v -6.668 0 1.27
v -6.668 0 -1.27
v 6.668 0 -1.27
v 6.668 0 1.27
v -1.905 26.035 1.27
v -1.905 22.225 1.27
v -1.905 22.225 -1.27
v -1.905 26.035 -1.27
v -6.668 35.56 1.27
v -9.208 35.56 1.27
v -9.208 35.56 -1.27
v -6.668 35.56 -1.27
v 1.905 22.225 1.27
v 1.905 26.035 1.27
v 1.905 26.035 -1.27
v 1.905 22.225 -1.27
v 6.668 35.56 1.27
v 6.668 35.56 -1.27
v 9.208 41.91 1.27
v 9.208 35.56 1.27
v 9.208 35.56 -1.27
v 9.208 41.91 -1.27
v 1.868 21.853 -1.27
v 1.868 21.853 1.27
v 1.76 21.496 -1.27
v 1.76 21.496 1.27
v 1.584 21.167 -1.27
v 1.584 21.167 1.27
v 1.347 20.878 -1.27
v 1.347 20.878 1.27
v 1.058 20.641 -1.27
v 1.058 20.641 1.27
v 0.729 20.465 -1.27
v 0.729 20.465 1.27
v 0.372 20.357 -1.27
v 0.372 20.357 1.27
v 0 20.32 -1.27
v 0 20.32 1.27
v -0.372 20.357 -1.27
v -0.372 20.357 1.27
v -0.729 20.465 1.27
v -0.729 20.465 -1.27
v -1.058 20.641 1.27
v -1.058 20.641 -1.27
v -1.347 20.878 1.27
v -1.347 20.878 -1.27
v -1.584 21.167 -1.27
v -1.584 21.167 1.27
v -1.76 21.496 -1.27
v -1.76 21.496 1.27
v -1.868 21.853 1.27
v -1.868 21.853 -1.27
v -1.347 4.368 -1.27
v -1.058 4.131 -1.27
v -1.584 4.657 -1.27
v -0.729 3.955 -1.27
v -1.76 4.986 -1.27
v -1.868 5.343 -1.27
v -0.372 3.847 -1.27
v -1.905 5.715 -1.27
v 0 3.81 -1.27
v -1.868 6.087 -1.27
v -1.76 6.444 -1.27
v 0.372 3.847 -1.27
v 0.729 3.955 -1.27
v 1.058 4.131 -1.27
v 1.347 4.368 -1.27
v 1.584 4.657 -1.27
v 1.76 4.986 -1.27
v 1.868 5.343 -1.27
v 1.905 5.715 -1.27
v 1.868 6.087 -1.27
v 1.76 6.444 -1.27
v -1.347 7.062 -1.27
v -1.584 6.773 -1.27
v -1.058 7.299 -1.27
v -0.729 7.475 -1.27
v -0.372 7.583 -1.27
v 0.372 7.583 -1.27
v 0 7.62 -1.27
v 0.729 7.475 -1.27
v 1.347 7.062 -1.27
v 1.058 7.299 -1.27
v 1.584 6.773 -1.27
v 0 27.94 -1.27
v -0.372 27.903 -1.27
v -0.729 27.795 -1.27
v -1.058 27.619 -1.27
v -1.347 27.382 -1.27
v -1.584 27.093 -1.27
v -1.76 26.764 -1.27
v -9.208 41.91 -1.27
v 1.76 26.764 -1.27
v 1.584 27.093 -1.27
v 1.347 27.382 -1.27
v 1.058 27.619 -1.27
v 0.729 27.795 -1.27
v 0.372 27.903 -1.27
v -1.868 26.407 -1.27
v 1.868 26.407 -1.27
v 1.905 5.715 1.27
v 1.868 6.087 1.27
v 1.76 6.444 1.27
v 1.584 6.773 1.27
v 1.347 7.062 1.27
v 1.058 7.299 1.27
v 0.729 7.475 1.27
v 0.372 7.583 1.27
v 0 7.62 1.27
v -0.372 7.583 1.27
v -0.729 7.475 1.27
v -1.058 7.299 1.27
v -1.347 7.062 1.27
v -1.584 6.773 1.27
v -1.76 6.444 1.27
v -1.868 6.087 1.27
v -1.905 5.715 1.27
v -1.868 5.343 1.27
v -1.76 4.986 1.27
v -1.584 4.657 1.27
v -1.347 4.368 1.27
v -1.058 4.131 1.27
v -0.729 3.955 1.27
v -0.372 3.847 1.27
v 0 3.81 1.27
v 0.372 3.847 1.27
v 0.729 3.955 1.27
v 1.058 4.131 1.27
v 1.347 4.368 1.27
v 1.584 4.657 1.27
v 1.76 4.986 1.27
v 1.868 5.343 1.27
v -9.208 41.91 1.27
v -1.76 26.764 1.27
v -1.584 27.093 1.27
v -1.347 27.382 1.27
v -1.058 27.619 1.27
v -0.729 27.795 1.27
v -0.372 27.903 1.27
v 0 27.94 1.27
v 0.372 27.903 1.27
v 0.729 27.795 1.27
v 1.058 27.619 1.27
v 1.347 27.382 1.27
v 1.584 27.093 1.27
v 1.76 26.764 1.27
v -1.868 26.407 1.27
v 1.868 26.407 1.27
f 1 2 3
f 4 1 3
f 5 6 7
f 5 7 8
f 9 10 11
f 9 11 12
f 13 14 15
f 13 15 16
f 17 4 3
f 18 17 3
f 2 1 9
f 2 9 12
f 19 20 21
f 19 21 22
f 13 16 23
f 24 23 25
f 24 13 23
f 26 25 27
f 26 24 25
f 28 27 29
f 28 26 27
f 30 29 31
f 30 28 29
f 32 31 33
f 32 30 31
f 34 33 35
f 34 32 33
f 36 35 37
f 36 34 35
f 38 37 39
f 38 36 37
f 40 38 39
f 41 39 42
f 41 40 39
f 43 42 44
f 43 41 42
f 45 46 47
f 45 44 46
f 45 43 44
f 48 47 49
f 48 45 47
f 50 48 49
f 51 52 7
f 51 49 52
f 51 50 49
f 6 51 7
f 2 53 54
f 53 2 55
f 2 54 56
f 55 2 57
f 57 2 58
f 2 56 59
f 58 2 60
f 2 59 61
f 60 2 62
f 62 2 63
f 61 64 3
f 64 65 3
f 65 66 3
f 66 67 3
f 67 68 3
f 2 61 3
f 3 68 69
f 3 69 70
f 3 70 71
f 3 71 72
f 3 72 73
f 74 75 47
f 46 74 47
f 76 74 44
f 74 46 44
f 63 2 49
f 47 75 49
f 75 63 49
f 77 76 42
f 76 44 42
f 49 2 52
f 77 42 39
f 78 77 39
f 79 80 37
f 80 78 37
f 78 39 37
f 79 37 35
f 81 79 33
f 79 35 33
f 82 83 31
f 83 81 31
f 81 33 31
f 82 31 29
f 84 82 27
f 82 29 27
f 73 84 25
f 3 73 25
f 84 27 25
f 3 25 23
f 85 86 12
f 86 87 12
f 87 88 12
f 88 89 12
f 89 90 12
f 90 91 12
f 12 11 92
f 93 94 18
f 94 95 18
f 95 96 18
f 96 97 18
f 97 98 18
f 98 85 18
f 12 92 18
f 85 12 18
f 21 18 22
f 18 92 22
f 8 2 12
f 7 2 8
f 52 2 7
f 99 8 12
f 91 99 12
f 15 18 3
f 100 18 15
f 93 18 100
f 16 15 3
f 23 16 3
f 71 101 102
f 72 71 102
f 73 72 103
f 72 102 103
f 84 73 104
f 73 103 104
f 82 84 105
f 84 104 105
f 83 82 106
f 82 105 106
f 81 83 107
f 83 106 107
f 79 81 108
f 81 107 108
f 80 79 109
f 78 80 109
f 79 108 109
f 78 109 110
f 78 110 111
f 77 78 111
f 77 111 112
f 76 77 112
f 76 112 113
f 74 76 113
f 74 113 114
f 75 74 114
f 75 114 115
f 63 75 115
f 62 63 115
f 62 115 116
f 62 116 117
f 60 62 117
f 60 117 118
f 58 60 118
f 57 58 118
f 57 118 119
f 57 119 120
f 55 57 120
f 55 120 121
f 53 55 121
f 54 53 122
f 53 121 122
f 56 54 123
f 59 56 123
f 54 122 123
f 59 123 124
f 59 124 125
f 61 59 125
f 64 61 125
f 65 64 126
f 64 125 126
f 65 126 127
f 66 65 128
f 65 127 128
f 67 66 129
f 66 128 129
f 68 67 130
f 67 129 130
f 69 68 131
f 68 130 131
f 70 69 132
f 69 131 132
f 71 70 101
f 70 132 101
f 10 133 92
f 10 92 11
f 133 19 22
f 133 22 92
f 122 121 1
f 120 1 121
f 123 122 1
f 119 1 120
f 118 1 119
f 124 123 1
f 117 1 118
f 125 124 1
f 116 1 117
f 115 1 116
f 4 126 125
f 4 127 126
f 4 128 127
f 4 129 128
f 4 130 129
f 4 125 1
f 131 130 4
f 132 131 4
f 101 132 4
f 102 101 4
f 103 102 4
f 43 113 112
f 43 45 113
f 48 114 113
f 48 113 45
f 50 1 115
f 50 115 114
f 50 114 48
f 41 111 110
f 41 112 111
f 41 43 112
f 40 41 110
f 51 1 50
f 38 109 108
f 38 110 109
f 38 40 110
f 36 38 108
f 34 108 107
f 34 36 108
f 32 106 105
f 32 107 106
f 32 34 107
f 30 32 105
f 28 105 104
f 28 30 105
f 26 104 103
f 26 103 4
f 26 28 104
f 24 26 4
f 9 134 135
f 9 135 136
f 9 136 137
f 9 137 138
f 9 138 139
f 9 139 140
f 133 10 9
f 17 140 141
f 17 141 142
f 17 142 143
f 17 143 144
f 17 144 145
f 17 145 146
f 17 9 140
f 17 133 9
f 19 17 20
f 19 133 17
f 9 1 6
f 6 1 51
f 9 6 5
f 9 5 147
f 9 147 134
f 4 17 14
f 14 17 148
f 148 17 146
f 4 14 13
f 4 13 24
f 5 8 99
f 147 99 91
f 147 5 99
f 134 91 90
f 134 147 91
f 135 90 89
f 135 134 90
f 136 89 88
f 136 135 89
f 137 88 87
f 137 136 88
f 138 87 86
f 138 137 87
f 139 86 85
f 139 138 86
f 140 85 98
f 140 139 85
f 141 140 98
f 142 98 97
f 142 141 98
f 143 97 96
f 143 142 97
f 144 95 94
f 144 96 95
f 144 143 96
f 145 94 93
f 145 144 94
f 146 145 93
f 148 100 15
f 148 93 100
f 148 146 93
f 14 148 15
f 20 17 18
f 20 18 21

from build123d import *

# Parameters (mm, degrees)
SKETCH1_W           = 13.335
SKETCH1_H           = 2.54
BOSS_EXTRUDE1_DEPTH = 35.56
BOSS_EXTRUDE2_DEPTH = 2.54
CUT_EXTRUDE1_REACH  = 4.54
SKETCH3_R           = 1.905


with BuildPart() as part:
    # Sketch1 → Boss-Extrude1 (new body)
    with BuildSketch(Plane(origin=(0, 0, 0), x_dir=(1, 0, 0), z_dir=(0, 1, 0))):
        Rectangle(SKETCH1_W, SKETCH1_H)
    extrude(amount=BOSS_EXTRUDE1_DEPTH)

    # Sketch2 → Boss-Extrude2 (add)
    with BuildSketch(Plane.XY.offset(1.27)):
        Polygon((-9.2075, 35.56), (-6.6675, 35.56), (6.6675, 35.56), (9.2075, 35.56), (9.2075, 41.91), (-9.2075, 41.91), align=None)
    extrude(amount=-BOSS_EXTRUDE2_DEPTH)

    # Sketch3 → Cut-Extrude1 (cut, up to next)
    with BuildSketch(Plane.XY.offset(1.27), mode=Mode.PRIVATE) as cut_extrude1_sk1:
        with Locations((0, 5.715)):
            Circle(SKETCH3_R)
    cut_extrude1_tool1 = extrude(cut_extrude1_sk1.sketch, amount=-CUT_EXTRUDE1_REACH, mode=Mode.PRIVATE) & part.part
    add(cut_extrude1_tool1.solids().sort_by_distance((0, 5.715, 1.27))[0], mode=Mode.SUBTRACT)
    # Sketch3 → Cut-Extrude1 (cut, up to next)
    with BuildSketch(Plane.XY.offset(1.27), mode=Mode.PRIVATE) as cut_extrude1_sk2:
        with BuildLine():
            Line((1.905, 26.035), (1.905, 22.225))
            ThreePointArc((1.905, 22.225), (0, 20.32), (-1.905, 22.225))
            Line((-1.905, 22.225), (-1.905, 26.035))
            ThreePointArc((-1.905, 26.035), (0, 27.94), (1.905, 26.035))
        make_face()
    cut_extrude1_tool2 = extrude(cut_extrude1_sk2.sketch, amount=-CUT_EXTRUDE1_REACH, mode=Mode.PRIVATE) & part.part
    add(cut_extrude1_tool2.solids().sort_by_distance((0, 24.13, 1.27))[0], mode=Mode.SUBTRACT)


solid = part.part
